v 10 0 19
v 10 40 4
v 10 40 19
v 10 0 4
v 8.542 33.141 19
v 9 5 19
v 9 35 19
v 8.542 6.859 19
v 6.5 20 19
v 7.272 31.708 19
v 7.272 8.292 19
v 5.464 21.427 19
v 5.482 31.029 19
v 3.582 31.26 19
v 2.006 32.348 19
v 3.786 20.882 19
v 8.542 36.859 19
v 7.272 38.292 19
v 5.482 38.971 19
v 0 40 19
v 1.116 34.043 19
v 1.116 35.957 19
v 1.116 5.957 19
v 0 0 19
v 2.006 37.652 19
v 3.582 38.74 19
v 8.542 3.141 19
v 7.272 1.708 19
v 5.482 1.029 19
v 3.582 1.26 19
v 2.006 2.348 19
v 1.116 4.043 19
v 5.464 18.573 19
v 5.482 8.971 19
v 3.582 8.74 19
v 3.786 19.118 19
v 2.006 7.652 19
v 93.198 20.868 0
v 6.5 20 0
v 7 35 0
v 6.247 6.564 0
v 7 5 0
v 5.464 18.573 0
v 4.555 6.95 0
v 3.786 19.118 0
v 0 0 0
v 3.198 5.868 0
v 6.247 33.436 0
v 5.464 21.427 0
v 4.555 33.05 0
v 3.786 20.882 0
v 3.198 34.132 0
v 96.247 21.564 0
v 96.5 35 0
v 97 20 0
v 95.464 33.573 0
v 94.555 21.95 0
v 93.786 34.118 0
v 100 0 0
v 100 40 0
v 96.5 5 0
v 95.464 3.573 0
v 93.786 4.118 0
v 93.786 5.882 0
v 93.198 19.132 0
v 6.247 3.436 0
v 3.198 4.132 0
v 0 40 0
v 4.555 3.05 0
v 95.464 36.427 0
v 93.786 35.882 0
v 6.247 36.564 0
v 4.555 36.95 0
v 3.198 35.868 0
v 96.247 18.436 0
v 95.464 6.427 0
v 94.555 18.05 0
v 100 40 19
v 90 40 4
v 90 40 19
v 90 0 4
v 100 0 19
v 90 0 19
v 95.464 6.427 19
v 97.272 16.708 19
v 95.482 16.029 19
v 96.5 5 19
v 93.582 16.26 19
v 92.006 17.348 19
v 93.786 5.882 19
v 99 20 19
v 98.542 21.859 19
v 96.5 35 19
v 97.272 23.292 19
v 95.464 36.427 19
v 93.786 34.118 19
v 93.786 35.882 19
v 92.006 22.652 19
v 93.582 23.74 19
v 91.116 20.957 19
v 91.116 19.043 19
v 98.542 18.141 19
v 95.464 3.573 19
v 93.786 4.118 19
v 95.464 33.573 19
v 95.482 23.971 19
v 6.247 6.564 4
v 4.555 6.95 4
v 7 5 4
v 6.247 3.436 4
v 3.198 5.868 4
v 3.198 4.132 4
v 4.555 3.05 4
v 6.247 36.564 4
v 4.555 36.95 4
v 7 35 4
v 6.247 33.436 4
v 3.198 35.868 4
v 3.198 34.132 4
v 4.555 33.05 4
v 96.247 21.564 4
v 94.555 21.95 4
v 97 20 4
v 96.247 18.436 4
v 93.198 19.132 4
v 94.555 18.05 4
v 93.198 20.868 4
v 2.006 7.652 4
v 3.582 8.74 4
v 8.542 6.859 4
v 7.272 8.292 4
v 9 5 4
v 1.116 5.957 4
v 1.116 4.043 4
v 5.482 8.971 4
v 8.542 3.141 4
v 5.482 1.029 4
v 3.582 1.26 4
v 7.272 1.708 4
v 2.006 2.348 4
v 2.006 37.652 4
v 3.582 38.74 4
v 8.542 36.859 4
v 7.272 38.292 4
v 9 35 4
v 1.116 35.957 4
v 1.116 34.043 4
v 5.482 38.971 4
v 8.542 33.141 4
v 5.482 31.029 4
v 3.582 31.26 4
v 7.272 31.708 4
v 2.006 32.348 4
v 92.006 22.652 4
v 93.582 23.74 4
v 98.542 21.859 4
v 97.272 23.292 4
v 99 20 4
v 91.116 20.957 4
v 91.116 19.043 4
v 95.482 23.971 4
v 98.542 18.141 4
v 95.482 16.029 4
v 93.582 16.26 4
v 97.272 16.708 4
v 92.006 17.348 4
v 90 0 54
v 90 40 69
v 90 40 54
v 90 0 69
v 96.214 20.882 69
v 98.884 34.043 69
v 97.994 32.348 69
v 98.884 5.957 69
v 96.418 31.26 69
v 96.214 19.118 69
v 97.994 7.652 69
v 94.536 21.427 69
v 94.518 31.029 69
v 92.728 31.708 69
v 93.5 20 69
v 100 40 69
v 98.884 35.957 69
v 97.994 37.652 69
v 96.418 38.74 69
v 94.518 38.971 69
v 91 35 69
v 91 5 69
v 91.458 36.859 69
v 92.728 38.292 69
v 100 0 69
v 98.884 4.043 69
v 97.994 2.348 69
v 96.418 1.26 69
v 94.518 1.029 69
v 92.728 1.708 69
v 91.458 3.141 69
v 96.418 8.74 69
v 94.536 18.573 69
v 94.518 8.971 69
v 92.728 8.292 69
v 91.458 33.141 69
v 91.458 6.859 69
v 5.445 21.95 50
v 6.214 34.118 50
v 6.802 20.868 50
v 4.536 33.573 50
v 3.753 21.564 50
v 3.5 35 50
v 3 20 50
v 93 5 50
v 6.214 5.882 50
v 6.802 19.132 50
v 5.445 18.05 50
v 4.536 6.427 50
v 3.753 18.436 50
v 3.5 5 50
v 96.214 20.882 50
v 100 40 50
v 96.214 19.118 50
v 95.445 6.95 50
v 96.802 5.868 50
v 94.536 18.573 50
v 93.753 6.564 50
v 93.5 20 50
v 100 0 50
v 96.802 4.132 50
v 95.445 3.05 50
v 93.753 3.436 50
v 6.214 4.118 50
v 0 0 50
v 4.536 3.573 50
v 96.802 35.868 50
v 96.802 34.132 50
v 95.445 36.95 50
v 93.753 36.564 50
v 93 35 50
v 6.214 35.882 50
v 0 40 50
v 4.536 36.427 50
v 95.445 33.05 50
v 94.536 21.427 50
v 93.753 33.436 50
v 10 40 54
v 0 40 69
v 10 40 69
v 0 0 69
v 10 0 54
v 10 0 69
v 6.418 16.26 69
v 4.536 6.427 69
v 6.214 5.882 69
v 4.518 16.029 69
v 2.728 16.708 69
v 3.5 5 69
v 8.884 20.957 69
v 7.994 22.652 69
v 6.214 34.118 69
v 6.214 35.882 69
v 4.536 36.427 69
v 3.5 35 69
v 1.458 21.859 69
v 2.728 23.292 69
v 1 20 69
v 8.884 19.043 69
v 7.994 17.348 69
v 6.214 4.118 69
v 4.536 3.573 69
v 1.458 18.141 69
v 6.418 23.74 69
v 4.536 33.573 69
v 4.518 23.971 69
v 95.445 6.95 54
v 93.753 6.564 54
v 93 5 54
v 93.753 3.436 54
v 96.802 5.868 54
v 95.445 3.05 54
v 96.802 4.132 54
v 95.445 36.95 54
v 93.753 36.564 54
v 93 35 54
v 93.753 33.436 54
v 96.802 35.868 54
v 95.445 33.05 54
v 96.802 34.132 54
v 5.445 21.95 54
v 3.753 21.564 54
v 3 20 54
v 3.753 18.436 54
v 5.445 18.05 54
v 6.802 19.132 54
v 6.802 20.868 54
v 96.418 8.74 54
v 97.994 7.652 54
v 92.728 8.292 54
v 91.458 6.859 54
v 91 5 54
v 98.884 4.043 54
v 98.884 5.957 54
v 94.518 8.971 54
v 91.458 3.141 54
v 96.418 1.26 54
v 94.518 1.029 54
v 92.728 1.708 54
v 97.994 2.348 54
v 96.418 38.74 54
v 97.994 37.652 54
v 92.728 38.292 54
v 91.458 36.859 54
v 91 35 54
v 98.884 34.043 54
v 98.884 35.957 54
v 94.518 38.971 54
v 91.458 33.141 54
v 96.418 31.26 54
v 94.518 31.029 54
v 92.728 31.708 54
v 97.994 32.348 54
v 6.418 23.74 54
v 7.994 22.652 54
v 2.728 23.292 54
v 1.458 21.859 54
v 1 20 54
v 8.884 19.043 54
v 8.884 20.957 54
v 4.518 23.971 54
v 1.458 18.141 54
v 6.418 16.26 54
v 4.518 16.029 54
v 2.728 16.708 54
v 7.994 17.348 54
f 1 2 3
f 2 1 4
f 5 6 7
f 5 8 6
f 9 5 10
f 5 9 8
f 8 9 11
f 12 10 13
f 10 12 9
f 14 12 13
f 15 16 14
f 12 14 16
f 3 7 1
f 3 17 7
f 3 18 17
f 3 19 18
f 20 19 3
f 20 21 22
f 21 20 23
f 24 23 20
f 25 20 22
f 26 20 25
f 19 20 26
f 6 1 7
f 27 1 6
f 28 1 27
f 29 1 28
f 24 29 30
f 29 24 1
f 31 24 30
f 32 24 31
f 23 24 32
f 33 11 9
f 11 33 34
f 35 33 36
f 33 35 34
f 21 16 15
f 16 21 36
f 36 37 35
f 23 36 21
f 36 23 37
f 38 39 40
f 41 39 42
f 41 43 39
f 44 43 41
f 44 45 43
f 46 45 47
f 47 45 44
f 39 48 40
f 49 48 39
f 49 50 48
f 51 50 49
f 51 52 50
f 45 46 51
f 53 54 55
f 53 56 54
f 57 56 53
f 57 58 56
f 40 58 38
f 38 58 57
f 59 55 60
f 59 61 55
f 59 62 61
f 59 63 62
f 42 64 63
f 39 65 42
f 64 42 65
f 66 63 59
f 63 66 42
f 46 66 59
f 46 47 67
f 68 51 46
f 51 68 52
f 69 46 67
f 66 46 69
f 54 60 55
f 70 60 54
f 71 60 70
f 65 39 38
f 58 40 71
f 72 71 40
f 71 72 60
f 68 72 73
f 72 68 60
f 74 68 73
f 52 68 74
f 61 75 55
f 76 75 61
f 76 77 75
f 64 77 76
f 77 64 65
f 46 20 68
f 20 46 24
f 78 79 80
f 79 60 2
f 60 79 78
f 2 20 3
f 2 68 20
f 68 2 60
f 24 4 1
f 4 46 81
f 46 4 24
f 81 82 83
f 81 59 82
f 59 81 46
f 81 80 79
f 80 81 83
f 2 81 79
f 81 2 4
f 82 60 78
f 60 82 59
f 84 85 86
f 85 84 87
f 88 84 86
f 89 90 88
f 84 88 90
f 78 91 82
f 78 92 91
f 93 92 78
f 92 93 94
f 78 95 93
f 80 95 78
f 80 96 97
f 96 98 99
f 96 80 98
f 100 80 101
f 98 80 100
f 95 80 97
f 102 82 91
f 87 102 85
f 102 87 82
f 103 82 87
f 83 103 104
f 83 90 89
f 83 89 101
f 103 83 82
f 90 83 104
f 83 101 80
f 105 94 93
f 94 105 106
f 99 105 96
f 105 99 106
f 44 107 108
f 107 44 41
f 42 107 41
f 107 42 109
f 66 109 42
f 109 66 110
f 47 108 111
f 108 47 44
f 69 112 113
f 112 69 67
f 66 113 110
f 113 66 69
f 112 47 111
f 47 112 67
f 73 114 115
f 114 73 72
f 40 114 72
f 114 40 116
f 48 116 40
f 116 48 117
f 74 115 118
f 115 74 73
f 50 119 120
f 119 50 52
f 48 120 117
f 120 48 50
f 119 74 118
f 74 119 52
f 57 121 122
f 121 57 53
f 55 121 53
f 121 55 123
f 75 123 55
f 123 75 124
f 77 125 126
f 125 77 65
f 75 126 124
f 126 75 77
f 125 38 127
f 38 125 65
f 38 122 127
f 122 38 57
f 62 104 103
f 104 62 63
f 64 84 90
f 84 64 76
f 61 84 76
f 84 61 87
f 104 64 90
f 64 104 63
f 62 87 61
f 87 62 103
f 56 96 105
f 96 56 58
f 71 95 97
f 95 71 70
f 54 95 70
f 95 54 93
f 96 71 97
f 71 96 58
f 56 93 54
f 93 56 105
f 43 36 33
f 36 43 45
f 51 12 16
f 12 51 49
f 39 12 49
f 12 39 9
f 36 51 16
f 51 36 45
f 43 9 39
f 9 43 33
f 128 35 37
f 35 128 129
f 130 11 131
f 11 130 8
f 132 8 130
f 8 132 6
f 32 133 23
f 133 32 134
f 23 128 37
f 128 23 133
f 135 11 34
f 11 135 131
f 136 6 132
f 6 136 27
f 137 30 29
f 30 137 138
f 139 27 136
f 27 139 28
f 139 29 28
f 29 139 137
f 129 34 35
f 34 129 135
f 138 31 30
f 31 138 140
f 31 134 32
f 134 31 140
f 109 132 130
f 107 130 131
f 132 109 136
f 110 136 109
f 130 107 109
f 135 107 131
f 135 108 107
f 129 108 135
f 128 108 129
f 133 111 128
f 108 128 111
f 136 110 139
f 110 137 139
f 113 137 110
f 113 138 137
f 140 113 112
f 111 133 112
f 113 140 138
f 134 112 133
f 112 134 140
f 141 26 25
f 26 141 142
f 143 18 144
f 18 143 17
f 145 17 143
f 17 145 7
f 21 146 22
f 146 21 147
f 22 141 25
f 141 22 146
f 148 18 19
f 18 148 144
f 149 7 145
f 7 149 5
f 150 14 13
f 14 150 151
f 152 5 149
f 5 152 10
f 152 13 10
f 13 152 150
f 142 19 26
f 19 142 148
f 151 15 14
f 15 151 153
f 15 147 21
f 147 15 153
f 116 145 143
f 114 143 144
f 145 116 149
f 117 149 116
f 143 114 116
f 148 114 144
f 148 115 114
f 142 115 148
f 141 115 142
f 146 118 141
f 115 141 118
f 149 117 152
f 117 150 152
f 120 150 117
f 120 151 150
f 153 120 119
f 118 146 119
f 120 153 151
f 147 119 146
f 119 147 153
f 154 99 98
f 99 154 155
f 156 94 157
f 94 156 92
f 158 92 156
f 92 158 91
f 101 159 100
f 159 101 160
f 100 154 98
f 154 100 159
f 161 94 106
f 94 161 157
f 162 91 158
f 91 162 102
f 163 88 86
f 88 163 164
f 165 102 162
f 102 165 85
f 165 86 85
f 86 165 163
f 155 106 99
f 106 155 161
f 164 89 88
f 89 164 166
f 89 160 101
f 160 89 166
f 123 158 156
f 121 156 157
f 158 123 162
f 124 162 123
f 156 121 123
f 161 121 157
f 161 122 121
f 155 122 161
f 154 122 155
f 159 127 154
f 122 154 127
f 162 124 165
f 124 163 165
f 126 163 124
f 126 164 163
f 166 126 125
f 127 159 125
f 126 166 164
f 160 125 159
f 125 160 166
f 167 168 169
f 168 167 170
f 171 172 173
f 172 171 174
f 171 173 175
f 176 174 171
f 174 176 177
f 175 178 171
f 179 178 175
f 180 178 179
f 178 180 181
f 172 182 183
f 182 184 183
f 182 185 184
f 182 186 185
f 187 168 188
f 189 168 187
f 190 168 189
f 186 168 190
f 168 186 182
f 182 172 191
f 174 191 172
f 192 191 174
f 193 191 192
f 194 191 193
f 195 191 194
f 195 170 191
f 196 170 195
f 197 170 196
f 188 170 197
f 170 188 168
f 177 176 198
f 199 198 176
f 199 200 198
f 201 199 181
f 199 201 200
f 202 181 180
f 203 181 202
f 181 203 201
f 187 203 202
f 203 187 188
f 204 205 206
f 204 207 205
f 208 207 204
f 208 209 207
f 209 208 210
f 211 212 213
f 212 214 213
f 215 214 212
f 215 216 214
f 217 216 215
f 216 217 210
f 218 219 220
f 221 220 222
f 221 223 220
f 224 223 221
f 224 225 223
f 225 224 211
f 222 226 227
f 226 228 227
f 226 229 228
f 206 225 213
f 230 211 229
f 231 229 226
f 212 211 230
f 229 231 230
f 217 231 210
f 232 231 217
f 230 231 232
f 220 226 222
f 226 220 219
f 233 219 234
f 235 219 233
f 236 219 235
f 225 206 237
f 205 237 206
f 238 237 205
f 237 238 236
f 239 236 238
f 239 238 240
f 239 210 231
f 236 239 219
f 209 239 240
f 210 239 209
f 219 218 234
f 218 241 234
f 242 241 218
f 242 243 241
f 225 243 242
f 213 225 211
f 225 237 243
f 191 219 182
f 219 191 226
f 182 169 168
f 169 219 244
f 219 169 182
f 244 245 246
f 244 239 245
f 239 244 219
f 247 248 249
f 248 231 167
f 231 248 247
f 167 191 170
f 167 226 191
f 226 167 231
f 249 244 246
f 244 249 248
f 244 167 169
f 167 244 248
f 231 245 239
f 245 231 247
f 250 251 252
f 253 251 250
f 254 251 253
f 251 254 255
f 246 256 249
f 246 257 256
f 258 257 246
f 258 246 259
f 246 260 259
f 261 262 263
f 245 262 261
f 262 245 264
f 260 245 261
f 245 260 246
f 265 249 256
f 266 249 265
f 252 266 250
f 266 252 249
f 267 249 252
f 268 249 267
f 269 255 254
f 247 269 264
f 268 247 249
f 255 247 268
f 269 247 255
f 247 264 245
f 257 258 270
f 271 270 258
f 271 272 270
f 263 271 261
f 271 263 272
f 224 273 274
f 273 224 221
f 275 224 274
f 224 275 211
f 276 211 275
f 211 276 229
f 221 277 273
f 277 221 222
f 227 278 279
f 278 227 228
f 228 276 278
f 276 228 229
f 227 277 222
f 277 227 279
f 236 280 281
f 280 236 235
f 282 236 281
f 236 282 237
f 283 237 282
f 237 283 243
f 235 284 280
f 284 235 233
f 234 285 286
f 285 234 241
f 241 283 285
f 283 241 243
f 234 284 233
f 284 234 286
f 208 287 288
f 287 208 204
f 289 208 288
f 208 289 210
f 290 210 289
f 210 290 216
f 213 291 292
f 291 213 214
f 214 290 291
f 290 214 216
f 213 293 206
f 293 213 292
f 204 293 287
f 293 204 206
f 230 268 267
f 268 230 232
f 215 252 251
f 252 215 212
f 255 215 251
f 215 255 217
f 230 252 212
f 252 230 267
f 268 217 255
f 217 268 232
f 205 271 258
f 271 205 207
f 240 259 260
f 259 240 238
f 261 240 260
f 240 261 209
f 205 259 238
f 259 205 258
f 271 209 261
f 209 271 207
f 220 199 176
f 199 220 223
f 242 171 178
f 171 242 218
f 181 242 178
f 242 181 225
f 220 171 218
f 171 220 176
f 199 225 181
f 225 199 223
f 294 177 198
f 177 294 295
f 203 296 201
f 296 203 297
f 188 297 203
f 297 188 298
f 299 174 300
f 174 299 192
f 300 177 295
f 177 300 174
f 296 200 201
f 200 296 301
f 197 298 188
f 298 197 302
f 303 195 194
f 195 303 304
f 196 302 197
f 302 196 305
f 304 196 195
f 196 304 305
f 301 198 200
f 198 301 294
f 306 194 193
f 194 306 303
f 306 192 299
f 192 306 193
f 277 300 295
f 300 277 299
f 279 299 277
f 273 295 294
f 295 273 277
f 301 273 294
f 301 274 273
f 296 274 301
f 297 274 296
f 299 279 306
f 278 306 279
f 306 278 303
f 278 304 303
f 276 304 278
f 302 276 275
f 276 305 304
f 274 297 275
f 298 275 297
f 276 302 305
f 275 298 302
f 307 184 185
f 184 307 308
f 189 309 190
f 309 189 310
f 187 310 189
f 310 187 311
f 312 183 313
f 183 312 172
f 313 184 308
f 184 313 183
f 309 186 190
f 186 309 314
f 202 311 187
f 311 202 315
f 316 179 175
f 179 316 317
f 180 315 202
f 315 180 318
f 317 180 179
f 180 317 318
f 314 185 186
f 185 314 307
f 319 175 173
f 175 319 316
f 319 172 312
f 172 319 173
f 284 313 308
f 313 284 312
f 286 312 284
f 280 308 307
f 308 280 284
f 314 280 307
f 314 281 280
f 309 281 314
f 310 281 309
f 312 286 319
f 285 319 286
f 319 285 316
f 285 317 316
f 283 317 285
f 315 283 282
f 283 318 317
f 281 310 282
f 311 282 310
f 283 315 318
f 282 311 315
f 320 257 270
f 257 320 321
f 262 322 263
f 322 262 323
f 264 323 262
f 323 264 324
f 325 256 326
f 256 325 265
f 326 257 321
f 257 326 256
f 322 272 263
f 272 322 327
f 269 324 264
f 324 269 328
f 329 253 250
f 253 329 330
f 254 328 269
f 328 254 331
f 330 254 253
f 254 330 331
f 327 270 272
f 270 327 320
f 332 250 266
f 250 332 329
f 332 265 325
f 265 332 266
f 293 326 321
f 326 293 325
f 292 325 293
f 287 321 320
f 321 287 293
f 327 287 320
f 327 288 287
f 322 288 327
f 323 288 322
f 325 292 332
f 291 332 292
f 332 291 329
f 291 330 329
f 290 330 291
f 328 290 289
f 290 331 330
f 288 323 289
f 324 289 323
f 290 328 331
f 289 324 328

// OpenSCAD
module shelfBody(sx, sy, sz,th){
    cube([10, sy, sz+th]);
    translate([10, 0,0])
        cube([sx, sy, th]);
    translate([sx+10, 0,0])
        cube([10, sy, sz+th]);
}

module shelfHeadHolePattern(sx, sy, sz,r,h){
    translate([5, 5,0])
        cylinder(h, r, r);
    translate([5, sy-5,0])
        cylinder(h, r, r);
    //translate([5, sy/2,0])
    //    cylinder(h, r, r);
    translate([sx+20-5, sy/2,0])
        cylinder(h, r, r);
}

module shelfThreadHolePattern(sx, sy, sz,r,h){
    translate([sx+20-5, 5,0])
        cylinder(h, r, r);
    translate([sx+20-5, sy-5,0])
        cylinder(h, r, r);
    //translate([5, sy/2,0])
    //    cylinder(h, r, r);
    translate([5, sy/2,0])
        cylinder(h, r, r);
}

module shelfModuleEven(sx, sy, sz, th, r){
    headDepth = 3;
    difference(){
        shelfBody(sx, sy, sz, th);
        translate([0,0,-1]){
            shelfHeadHolePattern(sx, sy, sz, r+0.5, th+sz+2);
            shelfThreadHolePattern(sx, sy, sz, r, th+sz+2);
        }
        translate([0, 0, th])
            shelfHeadHolePattern(sx, sy, sz, 4, sz+1);
        
    }
}

module shelfModuleOdd(sx, sy, sz, ,th, r){
    translate([sx+20, 0, 0])
        mirror([1,0,0])
            shelfModuleEven(sx, sy, sz, th, r);
    
}

shelfModuleEven(80, 40, 15, 4, 3/2);

translate([0,0,50]){
    shelfModuleOdd(80, 40, 15, 4, 3/2);
}
